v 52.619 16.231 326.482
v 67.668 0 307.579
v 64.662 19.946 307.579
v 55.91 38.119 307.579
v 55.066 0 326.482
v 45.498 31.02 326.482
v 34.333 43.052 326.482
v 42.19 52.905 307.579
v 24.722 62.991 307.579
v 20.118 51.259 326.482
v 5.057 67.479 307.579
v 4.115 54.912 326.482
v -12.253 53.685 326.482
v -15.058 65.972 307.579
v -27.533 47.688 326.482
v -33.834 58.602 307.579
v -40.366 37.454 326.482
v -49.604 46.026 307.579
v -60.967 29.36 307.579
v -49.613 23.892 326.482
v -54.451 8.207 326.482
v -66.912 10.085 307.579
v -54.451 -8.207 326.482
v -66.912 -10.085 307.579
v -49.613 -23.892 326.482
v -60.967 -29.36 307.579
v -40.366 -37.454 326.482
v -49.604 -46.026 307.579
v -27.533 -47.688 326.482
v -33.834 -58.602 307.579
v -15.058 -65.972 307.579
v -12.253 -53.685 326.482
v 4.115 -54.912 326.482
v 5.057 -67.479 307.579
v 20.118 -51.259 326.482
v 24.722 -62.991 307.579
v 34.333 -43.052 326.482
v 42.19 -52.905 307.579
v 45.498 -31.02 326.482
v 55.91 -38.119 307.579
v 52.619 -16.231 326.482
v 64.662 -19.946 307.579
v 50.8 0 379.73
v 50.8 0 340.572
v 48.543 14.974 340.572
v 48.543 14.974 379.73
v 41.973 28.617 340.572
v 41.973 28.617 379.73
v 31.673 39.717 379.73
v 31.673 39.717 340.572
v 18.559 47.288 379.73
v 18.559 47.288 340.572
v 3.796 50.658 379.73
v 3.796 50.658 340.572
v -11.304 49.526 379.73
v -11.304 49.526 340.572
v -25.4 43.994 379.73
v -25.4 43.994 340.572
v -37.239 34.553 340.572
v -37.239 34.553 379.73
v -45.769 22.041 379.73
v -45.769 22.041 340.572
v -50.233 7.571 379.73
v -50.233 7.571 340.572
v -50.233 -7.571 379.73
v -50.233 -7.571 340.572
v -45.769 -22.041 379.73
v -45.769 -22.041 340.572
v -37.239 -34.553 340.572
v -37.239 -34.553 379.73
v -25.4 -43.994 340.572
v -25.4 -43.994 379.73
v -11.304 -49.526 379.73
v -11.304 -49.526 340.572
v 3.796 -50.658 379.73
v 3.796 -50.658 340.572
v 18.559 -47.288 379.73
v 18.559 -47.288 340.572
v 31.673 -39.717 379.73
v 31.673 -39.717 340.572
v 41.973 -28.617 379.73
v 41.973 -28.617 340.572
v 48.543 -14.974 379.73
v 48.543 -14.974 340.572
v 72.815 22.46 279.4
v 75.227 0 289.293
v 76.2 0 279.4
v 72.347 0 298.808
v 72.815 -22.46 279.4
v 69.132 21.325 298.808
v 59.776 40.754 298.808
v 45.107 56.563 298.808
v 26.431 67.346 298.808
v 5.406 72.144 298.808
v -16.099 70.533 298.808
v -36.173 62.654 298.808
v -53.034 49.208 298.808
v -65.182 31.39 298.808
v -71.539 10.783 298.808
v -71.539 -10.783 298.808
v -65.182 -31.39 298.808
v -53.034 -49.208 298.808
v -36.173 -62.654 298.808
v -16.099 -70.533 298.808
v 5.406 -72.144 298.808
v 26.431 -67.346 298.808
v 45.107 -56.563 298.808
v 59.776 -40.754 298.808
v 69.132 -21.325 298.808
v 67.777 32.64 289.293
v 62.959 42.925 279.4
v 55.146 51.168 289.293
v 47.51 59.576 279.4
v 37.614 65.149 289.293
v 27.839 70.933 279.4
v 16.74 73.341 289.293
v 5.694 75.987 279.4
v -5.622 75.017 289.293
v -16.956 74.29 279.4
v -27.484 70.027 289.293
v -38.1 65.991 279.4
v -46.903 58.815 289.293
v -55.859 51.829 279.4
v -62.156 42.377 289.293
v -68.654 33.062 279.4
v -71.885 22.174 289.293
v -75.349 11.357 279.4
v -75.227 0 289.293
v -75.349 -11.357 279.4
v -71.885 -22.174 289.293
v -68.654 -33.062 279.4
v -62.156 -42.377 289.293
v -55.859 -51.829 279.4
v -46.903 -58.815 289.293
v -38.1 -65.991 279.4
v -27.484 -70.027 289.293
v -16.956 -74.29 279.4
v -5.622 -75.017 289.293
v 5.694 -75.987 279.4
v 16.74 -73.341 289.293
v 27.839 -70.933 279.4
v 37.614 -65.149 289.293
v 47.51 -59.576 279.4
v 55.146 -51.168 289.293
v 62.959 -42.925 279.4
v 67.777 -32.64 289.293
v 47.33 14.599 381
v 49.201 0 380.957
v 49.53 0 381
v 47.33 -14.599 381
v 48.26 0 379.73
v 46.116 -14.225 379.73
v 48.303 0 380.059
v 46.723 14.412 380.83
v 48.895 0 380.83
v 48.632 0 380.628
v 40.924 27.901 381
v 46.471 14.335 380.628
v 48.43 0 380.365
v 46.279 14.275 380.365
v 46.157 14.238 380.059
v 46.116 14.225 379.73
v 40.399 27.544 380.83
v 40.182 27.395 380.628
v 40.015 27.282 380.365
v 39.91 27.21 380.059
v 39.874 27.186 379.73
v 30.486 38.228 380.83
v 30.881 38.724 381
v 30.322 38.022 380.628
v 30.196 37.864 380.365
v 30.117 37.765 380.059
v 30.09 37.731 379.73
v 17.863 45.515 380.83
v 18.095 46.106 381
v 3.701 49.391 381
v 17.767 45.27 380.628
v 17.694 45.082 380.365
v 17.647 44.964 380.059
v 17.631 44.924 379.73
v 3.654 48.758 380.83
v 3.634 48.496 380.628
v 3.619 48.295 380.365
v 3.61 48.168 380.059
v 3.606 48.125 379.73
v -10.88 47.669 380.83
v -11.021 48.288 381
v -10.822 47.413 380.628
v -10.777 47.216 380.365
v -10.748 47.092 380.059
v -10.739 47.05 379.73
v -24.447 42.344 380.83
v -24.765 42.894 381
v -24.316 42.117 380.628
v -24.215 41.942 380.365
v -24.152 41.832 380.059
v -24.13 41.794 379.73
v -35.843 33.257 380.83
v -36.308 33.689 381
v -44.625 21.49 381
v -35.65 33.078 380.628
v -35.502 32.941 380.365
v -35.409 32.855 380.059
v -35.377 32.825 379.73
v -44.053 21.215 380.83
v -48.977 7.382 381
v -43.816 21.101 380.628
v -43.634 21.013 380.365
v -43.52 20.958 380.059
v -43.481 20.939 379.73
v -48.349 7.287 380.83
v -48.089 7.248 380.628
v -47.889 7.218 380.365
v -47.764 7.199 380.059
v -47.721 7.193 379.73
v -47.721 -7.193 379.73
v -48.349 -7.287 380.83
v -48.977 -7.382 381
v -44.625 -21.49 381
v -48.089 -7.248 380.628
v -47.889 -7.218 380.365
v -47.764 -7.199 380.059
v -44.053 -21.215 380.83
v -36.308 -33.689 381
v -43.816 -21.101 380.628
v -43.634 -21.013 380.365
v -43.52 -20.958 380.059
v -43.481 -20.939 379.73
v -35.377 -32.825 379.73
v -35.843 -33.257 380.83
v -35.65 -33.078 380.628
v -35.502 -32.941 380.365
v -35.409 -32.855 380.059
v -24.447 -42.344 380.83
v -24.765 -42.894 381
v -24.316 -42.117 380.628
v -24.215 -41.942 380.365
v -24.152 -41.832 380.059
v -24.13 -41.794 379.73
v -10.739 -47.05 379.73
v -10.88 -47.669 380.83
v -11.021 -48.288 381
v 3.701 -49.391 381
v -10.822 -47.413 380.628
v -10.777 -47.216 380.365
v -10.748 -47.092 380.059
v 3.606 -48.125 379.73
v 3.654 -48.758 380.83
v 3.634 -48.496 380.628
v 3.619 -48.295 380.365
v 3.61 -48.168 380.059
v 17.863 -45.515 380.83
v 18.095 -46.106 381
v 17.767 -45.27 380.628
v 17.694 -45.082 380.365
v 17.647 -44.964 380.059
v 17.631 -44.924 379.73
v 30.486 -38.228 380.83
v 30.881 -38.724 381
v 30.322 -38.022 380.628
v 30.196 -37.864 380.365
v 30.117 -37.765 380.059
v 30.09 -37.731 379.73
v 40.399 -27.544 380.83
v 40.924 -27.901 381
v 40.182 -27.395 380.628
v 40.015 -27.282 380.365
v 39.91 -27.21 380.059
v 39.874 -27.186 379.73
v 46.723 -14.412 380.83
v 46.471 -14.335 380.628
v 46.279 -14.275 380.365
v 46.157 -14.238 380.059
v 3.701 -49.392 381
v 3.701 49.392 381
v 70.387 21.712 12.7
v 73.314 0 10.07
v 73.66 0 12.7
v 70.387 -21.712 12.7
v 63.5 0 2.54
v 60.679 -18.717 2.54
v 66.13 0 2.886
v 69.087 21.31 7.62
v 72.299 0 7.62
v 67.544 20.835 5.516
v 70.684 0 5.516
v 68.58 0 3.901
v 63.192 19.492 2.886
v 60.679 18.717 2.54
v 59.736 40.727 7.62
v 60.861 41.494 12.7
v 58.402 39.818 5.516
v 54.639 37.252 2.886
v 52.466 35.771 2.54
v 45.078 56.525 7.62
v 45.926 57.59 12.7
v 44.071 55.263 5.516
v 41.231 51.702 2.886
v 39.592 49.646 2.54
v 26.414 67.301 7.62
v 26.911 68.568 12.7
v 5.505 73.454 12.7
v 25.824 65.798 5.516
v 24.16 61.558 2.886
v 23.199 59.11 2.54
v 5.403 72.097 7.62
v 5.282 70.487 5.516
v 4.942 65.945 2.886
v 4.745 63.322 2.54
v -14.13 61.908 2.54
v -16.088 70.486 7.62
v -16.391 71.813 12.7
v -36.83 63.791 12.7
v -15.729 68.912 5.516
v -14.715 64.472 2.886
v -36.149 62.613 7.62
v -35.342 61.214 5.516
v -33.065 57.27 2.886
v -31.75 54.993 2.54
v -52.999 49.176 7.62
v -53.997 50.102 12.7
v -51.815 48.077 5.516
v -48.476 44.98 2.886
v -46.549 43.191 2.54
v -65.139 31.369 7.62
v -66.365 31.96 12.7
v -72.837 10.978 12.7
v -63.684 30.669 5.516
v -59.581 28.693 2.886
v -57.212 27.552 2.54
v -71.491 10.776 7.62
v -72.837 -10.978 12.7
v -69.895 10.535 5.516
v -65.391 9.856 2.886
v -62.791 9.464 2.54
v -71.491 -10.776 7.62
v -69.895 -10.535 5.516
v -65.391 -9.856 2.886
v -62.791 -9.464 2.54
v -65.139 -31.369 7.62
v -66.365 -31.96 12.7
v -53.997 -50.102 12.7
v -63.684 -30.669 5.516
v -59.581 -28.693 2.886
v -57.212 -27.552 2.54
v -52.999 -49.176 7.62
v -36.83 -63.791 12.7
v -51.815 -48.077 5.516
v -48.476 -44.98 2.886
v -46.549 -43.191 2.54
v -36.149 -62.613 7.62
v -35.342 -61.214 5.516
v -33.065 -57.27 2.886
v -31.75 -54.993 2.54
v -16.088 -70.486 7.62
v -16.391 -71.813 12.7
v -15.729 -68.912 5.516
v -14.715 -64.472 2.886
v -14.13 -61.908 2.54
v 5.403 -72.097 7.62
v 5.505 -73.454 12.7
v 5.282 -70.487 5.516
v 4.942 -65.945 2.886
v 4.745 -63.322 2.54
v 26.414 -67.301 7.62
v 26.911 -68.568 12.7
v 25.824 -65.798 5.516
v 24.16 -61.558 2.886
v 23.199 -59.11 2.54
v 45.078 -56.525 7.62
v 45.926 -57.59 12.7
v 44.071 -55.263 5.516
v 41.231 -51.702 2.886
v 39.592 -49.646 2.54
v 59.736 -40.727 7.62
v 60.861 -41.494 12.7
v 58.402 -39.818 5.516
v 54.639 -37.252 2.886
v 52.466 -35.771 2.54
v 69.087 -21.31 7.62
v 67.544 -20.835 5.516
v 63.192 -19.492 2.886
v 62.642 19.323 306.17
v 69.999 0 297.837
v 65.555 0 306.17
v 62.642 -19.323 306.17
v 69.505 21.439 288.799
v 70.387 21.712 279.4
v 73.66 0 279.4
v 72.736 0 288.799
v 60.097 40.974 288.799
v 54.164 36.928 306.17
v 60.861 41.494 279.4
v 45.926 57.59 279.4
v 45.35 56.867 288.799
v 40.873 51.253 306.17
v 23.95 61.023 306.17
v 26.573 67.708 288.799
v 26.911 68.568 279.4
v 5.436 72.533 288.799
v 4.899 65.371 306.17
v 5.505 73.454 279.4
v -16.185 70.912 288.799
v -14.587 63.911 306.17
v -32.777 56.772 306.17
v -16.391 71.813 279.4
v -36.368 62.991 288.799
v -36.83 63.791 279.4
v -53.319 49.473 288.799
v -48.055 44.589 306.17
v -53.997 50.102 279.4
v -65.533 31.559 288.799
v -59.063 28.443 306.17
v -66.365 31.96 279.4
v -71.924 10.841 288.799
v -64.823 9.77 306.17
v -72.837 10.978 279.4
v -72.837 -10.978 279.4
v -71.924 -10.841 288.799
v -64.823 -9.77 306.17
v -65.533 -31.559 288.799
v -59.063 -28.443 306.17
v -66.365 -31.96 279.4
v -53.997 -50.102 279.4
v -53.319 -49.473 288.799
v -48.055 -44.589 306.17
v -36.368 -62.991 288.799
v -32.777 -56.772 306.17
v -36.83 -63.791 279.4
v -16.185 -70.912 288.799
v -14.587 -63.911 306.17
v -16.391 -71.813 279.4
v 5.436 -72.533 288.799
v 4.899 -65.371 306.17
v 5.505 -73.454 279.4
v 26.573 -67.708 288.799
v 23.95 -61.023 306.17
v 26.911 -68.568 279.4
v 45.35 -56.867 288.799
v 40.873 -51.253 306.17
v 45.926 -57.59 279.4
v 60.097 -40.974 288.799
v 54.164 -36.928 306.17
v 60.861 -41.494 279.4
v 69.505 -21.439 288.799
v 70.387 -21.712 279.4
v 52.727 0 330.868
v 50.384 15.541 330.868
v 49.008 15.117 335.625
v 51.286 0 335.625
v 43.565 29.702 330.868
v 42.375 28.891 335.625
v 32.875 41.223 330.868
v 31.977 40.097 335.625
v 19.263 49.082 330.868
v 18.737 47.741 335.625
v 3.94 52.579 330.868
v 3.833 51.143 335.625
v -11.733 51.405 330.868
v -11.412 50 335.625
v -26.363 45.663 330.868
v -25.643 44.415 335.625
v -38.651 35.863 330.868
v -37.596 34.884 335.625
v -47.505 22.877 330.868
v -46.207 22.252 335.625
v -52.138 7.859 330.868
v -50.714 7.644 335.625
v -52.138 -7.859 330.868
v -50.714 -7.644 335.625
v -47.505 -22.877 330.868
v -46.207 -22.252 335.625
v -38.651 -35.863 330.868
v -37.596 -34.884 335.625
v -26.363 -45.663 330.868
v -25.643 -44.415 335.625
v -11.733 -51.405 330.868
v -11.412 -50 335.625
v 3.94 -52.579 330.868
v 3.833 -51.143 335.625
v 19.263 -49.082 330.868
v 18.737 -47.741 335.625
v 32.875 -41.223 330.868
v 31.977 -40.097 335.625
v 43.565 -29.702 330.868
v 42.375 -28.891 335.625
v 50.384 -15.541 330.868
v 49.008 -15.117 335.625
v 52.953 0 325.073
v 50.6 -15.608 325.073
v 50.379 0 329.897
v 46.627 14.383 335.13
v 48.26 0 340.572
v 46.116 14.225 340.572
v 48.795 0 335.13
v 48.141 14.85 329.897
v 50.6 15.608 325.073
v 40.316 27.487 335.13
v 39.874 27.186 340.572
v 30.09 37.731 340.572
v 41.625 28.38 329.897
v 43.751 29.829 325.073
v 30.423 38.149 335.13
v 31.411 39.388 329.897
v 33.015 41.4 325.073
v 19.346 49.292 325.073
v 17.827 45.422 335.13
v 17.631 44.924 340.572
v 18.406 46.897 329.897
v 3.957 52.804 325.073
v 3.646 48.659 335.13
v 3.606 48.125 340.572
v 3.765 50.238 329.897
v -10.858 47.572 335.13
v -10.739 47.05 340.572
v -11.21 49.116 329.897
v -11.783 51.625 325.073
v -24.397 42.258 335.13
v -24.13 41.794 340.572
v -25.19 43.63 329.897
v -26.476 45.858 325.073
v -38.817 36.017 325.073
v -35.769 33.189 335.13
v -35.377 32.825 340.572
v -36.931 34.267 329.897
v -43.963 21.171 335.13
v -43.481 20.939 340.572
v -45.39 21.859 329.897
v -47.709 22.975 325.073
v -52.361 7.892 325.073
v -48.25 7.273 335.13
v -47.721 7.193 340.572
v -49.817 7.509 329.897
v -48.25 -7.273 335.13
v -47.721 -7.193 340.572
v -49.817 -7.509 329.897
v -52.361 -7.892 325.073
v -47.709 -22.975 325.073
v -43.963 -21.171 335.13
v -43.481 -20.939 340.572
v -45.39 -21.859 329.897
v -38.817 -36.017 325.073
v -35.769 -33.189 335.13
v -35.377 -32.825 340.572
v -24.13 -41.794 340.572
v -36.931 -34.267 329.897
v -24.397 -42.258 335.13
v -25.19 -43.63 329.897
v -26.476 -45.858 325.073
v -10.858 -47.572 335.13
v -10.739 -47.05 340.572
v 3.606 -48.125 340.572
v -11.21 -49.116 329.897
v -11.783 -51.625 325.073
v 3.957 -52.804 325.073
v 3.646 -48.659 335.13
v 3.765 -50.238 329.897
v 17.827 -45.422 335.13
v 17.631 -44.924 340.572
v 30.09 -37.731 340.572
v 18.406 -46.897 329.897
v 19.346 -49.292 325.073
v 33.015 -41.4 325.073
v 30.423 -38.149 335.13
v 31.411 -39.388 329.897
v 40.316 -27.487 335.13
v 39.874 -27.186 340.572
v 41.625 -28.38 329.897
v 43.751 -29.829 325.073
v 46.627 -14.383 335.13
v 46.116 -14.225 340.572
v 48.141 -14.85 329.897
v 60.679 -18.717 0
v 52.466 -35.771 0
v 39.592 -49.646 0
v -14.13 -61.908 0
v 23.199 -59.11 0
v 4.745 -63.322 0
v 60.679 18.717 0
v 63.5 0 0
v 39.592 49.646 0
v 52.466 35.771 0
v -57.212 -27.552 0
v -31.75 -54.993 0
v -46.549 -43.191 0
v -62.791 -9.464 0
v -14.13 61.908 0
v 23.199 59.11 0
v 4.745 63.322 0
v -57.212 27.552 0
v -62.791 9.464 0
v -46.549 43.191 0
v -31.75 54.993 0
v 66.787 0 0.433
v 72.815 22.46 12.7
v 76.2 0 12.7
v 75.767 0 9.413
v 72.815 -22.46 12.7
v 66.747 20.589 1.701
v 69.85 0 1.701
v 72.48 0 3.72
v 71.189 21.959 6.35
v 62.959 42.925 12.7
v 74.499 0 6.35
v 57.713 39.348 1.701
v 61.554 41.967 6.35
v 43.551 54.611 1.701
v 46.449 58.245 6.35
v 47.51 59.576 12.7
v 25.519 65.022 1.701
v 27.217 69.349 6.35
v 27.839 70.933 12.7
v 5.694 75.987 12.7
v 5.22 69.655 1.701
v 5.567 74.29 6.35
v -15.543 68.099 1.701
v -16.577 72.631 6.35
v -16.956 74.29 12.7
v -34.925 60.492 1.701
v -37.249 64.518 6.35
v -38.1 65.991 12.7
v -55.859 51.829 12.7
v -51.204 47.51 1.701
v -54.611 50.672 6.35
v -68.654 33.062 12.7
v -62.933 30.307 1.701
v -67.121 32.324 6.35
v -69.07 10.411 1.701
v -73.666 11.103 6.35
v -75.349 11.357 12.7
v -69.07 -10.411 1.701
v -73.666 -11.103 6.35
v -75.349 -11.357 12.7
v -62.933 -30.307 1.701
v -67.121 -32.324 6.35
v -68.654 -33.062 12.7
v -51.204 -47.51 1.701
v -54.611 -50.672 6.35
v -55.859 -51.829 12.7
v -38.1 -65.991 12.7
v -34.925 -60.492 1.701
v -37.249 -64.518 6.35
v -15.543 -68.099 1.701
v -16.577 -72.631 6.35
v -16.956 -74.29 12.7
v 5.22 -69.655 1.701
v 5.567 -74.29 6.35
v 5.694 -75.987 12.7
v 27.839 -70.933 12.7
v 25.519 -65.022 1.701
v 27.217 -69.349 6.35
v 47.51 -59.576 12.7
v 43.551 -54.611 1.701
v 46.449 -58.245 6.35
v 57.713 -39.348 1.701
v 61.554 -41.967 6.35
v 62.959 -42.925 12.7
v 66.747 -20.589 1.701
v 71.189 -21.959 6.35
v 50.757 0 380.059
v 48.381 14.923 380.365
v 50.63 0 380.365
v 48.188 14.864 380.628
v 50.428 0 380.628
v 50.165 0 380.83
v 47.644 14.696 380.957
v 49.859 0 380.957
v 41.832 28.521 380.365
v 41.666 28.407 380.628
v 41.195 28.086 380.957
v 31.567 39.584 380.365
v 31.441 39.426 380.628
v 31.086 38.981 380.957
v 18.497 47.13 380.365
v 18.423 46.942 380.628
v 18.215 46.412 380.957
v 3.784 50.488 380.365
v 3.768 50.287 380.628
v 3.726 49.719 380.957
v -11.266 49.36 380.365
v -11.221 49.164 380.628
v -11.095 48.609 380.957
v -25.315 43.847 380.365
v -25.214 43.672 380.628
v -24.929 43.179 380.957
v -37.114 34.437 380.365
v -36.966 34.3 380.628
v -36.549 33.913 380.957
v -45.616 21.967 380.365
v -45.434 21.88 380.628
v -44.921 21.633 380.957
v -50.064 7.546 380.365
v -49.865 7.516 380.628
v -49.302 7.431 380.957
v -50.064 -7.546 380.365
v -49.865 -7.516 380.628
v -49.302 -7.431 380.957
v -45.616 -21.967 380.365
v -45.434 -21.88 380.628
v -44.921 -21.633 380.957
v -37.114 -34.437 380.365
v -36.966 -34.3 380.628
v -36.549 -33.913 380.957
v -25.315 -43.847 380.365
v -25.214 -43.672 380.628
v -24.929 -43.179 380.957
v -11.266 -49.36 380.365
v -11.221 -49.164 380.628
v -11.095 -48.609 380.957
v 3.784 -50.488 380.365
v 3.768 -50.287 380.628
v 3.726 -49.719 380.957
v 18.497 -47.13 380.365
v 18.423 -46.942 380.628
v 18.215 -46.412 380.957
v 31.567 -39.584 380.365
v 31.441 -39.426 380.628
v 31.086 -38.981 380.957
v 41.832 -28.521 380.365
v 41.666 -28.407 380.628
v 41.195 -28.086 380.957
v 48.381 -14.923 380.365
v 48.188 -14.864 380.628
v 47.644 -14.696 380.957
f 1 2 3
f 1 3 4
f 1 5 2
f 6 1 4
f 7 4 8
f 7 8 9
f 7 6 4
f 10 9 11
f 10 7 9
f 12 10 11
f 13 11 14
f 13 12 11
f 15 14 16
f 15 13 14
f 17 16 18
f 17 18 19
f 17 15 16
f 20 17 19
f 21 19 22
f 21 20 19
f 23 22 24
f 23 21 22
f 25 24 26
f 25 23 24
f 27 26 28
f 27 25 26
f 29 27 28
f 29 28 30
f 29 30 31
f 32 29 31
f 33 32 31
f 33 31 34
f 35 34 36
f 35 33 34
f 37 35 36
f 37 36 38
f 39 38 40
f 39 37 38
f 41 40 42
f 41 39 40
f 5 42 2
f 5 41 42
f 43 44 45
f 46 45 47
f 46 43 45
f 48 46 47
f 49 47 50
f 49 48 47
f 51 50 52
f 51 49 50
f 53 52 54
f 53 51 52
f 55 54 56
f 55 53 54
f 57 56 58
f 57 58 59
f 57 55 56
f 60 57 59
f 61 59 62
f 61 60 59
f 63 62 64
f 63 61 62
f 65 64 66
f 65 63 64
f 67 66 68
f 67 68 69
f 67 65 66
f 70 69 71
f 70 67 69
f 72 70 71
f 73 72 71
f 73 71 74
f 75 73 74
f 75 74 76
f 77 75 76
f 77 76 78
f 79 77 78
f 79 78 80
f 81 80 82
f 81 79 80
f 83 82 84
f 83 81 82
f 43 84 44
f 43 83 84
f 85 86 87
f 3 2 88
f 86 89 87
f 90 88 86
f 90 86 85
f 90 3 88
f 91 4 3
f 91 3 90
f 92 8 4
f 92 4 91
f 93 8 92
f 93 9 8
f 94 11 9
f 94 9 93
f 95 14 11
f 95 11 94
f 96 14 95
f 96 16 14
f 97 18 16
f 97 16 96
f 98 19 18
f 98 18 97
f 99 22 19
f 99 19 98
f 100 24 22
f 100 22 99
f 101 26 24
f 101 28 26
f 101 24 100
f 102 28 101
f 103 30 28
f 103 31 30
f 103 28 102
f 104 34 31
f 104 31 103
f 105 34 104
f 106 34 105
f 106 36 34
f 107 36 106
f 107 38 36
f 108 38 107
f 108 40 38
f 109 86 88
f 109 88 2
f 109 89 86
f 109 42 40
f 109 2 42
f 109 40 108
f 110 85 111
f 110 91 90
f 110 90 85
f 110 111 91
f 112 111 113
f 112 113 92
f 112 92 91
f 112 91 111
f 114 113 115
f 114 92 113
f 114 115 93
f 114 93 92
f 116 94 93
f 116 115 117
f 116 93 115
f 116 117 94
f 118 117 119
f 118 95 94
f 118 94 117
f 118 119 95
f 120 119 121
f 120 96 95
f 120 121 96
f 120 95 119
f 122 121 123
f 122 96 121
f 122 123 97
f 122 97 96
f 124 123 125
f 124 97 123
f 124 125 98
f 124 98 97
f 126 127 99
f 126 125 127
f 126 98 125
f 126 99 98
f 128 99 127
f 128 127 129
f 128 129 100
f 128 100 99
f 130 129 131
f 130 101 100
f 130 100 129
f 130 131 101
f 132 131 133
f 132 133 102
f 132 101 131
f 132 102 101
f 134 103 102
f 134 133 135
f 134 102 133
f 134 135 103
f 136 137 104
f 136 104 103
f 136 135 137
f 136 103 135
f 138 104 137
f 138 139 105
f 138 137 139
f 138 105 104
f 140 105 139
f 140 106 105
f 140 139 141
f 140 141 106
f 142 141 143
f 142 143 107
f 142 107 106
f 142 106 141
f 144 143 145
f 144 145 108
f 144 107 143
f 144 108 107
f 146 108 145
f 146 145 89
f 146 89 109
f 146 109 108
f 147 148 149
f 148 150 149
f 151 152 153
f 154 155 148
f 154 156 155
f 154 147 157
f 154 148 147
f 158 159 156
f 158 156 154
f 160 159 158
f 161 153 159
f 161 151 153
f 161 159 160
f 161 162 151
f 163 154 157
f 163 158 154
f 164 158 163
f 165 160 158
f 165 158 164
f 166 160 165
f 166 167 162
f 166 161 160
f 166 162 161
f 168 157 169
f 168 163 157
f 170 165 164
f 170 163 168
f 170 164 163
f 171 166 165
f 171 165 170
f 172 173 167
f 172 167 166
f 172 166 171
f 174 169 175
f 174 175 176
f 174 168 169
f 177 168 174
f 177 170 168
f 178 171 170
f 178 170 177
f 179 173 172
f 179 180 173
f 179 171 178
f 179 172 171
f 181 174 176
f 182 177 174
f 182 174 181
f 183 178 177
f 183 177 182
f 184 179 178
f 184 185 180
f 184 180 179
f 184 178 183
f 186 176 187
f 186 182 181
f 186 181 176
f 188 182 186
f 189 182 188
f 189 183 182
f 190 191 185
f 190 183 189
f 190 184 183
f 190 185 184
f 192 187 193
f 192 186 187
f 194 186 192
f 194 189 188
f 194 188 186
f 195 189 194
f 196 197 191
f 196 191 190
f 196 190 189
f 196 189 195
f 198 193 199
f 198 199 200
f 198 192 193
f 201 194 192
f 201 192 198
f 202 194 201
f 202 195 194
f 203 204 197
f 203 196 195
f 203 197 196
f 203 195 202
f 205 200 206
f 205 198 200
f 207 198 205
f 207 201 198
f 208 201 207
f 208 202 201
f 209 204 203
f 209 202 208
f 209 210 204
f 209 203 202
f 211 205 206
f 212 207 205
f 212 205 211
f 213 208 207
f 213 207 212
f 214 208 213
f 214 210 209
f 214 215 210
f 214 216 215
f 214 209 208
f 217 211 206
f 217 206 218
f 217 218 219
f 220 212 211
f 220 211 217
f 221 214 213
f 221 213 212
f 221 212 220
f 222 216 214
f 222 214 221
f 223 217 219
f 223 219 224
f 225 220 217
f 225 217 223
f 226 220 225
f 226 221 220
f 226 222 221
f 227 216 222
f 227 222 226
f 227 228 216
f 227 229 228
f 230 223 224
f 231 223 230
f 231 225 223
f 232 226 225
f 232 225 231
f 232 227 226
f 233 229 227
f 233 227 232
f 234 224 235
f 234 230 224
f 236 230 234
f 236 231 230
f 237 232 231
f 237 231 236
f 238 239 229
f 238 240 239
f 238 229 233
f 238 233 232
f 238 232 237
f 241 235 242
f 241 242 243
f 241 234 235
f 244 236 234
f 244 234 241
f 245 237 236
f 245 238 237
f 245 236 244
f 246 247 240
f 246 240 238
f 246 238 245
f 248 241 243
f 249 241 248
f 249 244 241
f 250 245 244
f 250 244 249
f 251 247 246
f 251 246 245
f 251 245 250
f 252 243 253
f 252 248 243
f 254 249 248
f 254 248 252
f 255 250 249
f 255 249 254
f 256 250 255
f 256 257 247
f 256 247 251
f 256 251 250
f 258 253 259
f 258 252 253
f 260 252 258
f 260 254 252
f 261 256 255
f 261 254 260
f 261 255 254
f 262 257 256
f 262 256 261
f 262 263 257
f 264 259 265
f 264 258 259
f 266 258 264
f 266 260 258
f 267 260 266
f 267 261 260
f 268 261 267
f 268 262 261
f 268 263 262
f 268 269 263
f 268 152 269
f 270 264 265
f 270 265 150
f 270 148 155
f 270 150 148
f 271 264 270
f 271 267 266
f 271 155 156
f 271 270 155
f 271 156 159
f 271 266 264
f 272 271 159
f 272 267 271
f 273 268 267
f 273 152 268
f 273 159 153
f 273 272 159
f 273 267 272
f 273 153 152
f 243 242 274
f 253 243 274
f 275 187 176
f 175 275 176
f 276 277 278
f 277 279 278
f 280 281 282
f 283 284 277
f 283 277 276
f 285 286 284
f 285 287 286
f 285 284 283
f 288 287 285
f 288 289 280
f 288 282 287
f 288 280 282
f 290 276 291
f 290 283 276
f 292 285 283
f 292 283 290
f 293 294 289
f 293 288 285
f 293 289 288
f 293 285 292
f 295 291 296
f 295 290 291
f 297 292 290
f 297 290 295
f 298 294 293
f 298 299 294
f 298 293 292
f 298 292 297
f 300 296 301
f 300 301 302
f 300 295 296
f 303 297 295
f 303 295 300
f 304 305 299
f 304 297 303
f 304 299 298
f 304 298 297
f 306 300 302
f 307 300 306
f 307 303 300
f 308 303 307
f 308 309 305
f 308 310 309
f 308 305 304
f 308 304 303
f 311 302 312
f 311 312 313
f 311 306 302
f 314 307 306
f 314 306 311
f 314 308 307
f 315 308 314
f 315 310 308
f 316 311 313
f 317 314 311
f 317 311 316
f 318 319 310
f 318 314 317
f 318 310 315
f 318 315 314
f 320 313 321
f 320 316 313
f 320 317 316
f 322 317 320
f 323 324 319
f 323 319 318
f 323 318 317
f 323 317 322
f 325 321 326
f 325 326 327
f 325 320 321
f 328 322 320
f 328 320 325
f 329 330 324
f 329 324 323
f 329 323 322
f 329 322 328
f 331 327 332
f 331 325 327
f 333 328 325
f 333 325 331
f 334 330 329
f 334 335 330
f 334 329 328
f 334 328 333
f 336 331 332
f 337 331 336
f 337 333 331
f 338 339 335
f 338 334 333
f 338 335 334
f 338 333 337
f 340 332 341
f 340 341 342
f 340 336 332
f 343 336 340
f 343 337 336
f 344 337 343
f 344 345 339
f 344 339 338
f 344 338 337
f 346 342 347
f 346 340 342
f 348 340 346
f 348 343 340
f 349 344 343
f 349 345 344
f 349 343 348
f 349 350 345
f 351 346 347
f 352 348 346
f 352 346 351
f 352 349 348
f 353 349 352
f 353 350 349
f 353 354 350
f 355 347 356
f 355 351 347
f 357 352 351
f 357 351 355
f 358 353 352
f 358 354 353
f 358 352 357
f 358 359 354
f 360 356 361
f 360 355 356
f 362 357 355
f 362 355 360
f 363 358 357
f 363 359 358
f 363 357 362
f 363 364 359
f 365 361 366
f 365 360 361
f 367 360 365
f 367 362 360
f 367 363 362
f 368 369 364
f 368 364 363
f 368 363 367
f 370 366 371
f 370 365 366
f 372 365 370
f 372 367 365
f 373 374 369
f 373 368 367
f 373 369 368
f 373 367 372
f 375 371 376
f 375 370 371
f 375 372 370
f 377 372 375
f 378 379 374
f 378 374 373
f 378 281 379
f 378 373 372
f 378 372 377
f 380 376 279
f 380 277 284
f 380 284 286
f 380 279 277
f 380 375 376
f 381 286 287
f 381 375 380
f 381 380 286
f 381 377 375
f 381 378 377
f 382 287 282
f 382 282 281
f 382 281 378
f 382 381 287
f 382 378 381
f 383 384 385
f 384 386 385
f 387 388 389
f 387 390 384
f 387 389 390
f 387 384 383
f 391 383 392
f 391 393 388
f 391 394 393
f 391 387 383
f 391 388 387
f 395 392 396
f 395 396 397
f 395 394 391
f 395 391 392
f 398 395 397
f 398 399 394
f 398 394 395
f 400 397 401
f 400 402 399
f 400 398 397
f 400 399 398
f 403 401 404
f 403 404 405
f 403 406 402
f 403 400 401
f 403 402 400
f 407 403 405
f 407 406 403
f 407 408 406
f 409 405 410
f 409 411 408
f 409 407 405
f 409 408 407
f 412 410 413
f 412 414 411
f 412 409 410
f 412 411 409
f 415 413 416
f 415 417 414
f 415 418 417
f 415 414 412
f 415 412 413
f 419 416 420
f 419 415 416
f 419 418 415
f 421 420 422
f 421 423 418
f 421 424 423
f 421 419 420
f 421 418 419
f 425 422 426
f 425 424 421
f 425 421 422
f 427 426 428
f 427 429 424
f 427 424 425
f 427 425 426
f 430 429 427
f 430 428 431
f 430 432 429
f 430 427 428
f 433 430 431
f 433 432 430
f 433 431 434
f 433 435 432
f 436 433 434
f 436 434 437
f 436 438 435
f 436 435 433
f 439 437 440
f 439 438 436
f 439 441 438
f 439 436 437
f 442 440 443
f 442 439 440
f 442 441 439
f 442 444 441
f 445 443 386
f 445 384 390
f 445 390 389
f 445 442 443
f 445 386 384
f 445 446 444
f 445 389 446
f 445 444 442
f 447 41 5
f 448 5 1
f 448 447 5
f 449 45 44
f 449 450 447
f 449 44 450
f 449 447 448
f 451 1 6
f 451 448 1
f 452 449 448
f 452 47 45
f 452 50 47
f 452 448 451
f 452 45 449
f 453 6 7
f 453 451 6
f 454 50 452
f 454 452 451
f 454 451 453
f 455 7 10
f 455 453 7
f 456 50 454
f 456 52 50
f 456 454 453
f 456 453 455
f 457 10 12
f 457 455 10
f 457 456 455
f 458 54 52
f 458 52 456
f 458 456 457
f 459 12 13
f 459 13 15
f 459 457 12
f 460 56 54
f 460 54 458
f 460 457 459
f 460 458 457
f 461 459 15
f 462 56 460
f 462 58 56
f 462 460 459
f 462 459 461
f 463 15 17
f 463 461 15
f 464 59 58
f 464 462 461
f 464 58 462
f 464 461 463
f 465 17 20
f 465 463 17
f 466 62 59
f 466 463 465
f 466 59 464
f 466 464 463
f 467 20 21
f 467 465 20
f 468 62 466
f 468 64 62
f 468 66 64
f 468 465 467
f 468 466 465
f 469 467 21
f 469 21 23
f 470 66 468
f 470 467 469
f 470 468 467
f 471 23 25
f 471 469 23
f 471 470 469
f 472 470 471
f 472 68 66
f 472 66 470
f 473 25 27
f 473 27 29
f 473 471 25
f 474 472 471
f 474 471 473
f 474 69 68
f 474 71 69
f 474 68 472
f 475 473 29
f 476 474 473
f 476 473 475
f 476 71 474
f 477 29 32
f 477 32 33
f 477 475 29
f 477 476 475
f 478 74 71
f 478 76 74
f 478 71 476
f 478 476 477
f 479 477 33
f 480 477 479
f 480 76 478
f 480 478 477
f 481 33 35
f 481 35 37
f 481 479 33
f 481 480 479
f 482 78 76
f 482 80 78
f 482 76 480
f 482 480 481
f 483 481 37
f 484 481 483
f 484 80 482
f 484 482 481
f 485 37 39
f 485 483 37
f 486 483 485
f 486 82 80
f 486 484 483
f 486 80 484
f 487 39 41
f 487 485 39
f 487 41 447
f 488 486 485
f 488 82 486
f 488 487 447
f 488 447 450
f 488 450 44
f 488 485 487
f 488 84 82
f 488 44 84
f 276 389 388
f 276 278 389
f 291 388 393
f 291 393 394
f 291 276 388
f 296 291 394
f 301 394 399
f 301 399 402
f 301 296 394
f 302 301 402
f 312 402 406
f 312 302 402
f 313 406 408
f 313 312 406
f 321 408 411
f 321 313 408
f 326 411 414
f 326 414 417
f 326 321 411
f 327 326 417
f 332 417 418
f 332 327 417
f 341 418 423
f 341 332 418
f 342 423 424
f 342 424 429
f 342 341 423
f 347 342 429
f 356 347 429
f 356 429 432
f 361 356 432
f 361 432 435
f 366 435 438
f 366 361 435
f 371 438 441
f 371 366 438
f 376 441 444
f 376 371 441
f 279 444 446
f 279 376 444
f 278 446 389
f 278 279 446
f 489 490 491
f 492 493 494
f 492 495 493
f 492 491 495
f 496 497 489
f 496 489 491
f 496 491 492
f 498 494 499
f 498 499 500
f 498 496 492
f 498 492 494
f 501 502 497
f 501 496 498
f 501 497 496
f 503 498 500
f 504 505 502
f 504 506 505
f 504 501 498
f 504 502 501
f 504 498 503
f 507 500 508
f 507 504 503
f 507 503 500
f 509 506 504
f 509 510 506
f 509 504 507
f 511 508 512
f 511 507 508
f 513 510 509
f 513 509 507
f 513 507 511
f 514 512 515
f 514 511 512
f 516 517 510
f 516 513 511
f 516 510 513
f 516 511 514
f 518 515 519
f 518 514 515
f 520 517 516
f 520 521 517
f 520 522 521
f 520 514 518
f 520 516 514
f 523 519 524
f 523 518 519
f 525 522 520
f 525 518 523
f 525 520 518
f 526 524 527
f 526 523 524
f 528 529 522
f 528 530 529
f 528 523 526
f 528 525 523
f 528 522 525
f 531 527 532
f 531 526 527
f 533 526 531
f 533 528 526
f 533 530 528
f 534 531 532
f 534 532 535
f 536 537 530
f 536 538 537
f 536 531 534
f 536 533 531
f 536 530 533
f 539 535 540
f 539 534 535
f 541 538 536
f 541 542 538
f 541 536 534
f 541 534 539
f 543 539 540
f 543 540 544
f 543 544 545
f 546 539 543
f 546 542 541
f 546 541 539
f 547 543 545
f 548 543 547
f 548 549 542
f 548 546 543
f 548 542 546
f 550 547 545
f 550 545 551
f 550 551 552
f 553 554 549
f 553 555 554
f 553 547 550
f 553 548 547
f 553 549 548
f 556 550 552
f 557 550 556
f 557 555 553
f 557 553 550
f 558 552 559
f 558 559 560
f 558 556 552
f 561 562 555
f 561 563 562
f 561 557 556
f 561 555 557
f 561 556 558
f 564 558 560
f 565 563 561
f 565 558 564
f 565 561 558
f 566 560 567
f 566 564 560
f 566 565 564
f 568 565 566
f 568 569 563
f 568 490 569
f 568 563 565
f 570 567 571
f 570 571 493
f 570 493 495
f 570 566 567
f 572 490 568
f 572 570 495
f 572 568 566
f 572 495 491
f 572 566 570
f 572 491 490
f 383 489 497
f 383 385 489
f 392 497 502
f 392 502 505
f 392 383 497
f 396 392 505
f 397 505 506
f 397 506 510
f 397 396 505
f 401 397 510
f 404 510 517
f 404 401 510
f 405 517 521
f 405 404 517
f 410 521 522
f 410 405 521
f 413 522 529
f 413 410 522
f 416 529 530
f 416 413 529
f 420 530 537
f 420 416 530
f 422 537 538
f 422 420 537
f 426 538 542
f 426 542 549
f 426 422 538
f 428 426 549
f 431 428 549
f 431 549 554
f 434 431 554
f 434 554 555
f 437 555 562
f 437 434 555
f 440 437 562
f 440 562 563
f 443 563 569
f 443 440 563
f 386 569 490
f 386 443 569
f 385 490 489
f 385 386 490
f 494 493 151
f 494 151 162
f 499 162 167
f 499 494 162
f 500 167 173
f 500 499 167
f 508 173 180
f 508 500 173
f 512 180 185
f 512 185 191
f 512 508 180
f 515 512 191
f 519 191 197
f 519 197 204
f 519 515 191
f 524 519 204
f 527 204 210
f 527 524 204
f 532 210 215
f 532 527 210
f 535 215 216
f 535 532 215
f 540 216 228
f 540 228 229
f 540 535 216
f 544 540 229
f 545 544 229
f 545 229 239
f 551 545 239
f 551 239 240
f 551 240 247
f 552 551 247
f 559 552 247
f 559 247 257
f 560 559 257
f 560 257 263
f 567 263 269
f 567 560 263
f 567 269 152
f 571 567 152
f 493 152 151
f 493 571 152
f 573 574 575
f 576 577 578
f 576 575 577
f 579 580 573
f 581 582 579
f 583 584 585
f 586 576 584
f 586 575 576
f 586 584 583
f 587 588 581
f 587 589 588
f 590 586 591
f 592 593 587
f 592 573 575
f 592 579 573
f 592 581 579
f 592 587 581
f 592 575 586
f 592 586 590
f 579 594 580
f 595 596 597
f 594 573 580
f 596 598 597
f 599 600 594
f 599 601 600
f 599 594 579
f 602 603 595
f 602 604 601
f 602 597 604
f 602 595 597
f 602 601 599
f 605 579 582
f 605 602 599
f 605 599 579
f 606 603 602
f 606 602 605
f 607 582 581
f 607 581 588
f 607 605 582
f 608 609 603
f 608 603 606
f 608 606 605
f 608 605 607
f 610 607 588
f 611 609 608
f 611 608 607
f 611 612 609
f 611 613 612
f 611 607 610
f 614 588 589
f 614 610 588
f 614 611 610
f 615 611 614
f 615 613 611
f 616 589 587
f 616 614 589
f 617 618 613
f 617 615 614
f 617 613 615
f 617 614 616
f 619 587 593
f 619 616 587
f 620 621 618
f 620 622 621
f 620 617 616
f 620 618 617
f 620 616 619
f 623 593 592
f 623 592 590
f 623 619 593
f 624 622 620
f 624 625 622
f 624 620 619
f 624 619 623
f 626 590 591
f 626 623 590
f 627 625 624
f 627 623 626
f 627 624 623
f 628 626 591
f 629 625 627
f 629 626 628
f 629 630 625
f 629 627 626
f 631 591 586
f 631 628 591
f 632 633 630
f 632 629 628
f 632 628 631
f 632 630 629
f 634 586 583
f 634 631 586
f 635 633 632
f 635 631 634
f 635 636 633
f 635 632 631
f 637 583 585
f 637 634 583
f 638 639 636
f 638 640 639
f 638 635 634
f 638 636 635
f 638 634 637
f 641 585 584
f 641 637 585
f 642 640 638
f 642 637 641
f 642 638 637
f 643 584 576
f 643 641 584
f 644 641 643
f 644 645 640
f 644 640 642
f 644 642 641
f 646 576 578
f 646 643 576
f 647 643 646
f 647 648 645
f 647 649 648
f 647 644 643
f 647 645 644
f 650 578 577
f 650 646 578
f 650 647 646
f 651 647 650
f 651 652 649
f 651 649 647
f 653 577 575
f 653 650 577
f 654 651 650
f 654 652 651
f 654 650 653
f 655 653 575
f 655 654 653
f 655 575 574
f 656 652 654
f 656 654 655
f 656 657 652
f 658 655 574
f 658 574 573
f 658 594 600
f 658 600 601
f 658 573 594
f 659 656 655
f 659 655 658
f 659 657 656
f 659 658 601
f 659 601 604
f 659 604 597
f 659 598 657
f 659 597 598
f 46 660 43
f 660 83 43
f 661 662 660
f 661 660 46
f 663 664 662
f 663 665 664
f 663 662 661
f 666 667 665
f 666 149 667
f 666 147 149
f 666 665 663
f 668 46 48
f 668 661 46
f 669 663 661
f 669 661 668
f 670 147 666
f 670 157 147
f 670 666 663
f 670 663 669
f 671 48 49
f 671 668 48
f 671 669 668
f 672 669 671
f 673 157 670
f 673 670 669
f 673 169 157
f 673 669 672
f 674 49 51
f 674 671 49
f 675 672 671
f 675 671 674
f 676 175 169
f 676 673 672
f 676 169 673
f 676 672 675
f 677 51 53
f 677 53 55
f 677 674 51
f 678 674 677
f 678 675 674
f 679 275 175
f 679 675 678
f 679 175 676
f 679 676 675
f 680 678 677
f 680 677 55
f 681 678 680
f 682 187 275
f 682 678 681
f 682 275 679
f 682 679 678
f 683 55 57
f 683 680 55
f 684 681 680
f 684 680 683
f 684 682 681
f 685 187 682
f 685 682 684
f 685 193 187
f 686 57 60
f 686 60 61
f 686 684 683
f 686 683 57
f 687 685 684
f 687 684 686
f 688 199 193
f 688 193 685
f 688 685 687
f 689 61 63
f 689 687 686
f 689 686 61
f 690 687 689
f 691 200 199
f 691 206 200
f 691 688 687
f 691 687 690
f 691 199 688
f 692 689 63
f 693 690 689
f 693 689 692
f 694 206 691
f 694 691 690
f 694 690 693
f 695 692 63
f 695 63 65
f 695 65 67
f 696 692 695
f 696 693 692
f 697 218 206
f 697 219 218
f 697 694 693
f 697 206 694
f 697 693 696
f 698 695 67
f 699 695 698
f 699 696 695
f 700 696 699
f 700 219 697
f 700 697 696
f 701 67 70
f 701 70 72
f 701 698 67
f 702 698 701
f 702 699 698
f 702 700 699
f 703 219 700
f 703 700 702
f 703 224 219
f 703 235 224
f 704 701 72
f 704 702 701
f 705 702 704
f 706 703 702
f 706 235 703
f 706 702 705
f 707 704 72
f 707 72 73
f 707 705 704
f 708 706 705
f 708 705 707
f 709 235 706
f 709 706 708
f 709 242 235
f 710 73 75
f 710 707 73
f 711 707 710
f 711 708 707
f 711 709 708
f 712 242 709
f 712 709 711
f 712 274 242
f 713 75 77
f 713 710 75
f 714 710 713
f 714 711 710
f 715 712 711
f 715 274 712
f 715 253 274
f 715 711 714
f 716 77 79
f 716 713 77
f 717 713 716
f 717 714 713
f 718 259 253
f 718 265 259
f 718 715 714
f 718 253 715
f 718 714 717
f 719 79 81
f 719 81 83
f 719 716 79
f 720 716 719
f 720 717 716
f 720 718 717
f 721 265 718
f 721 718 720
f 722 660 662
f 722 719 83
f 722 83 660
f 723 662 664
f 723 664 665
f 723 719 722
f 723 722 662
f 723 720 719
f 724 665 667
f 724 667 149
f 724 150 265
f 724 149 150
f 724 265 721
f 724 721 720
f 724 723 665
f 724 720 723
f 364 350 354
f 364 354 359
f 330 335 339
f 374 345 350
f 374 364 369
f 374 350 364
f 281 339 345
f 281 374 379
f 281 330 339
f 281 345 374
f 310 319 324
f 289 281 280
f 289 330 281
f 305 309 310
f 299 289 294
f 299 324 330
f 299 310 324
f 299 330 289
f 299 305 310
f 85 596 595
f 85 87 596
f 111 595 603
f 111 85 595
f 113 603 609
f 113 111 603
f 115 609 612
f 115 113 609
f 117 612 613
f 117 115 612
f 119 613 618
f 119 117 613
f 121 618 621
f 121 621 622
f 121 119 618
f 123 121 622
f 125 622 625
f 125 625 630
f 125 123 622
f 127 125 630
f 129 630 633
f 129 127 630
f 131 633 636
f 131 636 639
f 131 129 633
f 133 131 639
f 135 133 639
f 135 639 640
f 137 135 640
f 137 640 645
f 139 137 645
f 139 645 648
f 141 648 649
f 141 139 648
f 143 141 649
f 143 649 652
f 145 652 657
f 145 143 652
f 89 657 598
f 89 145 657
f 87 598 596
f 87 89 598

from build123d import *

# Parameters (mm, degrees)
F2_R = 1.26999


# Not quite as in the source:
# - a fillet or chamfer is up to 0.001 mm smaller than in the source, because OpenCascade refuses the exact size


with BuildPart() as f1:
    # F0 (on Front) → F1 (revolve)
    with BuildSketch(Plane.XZ):
        with BuildLine():
            Line((76.2, 12.7), (76.2, 279.4))
            ThreePointArc((76.2, 279.4), (74.0202749456, 294.1210347534), (67.6681549524, 307.5787699682))
            Line((67.6681549524, 307.5787699682), (55.0659225238, 326.4821186111))
            ThreePointArc((55.0659225238, 326.4821186111), (51.8898625272, 333.2109862185), (50.8, 340.5715035952))
            Line((50.8, 340.5715035952), (50.8, 381))
            Line((50.8, 381), (48.26, 381))
            Line((48.26, 381), (48.26, 340.5715035952))
            ThreePointArc((48.26, 340.5715035952), (49.4588487799, 332.4749344808), (52.9525147762, 325.0731801126))
            Line((52.9525147762, 325.0731801126), (65.5547472047, 306.1698314698))
            ThreePointArc((65.5547472047, 306.1698314698), (71.5892611984, 293.3849830157), (73.66, 279.4))
            Line((73.66, 279.4), (73.66, 12.7))
            ThreePointArc((73.66, 12.7), (70.6842048969, 5.5157951031), (63.5, 2.54))
            Line((63.5, 2.54), (0, 2.54))
            Line((0, 2.54), (0, 0))
            Line((0, 0), (63.5, 0))
            ThreePointArc((63.5, 0), (72.4802561211, 3.7197438789), (76.2, 12.7))
        make_face()
    revolve(axis=Axis((0, 0, 199.2018222809), (0, 0, 1)))

    # F2 (radius 1.27 in the source; OpenCascade refuses exactly that, so slightly less here)
    f2_edges = [f1.edges().sort_by_distance(p)[0] for p in [
        (-50.8, 0, 381),
        (-48.26, 0, 381),
    ]]
    fillet(f2_edges, radius=F2_R)


solid = f1.part
